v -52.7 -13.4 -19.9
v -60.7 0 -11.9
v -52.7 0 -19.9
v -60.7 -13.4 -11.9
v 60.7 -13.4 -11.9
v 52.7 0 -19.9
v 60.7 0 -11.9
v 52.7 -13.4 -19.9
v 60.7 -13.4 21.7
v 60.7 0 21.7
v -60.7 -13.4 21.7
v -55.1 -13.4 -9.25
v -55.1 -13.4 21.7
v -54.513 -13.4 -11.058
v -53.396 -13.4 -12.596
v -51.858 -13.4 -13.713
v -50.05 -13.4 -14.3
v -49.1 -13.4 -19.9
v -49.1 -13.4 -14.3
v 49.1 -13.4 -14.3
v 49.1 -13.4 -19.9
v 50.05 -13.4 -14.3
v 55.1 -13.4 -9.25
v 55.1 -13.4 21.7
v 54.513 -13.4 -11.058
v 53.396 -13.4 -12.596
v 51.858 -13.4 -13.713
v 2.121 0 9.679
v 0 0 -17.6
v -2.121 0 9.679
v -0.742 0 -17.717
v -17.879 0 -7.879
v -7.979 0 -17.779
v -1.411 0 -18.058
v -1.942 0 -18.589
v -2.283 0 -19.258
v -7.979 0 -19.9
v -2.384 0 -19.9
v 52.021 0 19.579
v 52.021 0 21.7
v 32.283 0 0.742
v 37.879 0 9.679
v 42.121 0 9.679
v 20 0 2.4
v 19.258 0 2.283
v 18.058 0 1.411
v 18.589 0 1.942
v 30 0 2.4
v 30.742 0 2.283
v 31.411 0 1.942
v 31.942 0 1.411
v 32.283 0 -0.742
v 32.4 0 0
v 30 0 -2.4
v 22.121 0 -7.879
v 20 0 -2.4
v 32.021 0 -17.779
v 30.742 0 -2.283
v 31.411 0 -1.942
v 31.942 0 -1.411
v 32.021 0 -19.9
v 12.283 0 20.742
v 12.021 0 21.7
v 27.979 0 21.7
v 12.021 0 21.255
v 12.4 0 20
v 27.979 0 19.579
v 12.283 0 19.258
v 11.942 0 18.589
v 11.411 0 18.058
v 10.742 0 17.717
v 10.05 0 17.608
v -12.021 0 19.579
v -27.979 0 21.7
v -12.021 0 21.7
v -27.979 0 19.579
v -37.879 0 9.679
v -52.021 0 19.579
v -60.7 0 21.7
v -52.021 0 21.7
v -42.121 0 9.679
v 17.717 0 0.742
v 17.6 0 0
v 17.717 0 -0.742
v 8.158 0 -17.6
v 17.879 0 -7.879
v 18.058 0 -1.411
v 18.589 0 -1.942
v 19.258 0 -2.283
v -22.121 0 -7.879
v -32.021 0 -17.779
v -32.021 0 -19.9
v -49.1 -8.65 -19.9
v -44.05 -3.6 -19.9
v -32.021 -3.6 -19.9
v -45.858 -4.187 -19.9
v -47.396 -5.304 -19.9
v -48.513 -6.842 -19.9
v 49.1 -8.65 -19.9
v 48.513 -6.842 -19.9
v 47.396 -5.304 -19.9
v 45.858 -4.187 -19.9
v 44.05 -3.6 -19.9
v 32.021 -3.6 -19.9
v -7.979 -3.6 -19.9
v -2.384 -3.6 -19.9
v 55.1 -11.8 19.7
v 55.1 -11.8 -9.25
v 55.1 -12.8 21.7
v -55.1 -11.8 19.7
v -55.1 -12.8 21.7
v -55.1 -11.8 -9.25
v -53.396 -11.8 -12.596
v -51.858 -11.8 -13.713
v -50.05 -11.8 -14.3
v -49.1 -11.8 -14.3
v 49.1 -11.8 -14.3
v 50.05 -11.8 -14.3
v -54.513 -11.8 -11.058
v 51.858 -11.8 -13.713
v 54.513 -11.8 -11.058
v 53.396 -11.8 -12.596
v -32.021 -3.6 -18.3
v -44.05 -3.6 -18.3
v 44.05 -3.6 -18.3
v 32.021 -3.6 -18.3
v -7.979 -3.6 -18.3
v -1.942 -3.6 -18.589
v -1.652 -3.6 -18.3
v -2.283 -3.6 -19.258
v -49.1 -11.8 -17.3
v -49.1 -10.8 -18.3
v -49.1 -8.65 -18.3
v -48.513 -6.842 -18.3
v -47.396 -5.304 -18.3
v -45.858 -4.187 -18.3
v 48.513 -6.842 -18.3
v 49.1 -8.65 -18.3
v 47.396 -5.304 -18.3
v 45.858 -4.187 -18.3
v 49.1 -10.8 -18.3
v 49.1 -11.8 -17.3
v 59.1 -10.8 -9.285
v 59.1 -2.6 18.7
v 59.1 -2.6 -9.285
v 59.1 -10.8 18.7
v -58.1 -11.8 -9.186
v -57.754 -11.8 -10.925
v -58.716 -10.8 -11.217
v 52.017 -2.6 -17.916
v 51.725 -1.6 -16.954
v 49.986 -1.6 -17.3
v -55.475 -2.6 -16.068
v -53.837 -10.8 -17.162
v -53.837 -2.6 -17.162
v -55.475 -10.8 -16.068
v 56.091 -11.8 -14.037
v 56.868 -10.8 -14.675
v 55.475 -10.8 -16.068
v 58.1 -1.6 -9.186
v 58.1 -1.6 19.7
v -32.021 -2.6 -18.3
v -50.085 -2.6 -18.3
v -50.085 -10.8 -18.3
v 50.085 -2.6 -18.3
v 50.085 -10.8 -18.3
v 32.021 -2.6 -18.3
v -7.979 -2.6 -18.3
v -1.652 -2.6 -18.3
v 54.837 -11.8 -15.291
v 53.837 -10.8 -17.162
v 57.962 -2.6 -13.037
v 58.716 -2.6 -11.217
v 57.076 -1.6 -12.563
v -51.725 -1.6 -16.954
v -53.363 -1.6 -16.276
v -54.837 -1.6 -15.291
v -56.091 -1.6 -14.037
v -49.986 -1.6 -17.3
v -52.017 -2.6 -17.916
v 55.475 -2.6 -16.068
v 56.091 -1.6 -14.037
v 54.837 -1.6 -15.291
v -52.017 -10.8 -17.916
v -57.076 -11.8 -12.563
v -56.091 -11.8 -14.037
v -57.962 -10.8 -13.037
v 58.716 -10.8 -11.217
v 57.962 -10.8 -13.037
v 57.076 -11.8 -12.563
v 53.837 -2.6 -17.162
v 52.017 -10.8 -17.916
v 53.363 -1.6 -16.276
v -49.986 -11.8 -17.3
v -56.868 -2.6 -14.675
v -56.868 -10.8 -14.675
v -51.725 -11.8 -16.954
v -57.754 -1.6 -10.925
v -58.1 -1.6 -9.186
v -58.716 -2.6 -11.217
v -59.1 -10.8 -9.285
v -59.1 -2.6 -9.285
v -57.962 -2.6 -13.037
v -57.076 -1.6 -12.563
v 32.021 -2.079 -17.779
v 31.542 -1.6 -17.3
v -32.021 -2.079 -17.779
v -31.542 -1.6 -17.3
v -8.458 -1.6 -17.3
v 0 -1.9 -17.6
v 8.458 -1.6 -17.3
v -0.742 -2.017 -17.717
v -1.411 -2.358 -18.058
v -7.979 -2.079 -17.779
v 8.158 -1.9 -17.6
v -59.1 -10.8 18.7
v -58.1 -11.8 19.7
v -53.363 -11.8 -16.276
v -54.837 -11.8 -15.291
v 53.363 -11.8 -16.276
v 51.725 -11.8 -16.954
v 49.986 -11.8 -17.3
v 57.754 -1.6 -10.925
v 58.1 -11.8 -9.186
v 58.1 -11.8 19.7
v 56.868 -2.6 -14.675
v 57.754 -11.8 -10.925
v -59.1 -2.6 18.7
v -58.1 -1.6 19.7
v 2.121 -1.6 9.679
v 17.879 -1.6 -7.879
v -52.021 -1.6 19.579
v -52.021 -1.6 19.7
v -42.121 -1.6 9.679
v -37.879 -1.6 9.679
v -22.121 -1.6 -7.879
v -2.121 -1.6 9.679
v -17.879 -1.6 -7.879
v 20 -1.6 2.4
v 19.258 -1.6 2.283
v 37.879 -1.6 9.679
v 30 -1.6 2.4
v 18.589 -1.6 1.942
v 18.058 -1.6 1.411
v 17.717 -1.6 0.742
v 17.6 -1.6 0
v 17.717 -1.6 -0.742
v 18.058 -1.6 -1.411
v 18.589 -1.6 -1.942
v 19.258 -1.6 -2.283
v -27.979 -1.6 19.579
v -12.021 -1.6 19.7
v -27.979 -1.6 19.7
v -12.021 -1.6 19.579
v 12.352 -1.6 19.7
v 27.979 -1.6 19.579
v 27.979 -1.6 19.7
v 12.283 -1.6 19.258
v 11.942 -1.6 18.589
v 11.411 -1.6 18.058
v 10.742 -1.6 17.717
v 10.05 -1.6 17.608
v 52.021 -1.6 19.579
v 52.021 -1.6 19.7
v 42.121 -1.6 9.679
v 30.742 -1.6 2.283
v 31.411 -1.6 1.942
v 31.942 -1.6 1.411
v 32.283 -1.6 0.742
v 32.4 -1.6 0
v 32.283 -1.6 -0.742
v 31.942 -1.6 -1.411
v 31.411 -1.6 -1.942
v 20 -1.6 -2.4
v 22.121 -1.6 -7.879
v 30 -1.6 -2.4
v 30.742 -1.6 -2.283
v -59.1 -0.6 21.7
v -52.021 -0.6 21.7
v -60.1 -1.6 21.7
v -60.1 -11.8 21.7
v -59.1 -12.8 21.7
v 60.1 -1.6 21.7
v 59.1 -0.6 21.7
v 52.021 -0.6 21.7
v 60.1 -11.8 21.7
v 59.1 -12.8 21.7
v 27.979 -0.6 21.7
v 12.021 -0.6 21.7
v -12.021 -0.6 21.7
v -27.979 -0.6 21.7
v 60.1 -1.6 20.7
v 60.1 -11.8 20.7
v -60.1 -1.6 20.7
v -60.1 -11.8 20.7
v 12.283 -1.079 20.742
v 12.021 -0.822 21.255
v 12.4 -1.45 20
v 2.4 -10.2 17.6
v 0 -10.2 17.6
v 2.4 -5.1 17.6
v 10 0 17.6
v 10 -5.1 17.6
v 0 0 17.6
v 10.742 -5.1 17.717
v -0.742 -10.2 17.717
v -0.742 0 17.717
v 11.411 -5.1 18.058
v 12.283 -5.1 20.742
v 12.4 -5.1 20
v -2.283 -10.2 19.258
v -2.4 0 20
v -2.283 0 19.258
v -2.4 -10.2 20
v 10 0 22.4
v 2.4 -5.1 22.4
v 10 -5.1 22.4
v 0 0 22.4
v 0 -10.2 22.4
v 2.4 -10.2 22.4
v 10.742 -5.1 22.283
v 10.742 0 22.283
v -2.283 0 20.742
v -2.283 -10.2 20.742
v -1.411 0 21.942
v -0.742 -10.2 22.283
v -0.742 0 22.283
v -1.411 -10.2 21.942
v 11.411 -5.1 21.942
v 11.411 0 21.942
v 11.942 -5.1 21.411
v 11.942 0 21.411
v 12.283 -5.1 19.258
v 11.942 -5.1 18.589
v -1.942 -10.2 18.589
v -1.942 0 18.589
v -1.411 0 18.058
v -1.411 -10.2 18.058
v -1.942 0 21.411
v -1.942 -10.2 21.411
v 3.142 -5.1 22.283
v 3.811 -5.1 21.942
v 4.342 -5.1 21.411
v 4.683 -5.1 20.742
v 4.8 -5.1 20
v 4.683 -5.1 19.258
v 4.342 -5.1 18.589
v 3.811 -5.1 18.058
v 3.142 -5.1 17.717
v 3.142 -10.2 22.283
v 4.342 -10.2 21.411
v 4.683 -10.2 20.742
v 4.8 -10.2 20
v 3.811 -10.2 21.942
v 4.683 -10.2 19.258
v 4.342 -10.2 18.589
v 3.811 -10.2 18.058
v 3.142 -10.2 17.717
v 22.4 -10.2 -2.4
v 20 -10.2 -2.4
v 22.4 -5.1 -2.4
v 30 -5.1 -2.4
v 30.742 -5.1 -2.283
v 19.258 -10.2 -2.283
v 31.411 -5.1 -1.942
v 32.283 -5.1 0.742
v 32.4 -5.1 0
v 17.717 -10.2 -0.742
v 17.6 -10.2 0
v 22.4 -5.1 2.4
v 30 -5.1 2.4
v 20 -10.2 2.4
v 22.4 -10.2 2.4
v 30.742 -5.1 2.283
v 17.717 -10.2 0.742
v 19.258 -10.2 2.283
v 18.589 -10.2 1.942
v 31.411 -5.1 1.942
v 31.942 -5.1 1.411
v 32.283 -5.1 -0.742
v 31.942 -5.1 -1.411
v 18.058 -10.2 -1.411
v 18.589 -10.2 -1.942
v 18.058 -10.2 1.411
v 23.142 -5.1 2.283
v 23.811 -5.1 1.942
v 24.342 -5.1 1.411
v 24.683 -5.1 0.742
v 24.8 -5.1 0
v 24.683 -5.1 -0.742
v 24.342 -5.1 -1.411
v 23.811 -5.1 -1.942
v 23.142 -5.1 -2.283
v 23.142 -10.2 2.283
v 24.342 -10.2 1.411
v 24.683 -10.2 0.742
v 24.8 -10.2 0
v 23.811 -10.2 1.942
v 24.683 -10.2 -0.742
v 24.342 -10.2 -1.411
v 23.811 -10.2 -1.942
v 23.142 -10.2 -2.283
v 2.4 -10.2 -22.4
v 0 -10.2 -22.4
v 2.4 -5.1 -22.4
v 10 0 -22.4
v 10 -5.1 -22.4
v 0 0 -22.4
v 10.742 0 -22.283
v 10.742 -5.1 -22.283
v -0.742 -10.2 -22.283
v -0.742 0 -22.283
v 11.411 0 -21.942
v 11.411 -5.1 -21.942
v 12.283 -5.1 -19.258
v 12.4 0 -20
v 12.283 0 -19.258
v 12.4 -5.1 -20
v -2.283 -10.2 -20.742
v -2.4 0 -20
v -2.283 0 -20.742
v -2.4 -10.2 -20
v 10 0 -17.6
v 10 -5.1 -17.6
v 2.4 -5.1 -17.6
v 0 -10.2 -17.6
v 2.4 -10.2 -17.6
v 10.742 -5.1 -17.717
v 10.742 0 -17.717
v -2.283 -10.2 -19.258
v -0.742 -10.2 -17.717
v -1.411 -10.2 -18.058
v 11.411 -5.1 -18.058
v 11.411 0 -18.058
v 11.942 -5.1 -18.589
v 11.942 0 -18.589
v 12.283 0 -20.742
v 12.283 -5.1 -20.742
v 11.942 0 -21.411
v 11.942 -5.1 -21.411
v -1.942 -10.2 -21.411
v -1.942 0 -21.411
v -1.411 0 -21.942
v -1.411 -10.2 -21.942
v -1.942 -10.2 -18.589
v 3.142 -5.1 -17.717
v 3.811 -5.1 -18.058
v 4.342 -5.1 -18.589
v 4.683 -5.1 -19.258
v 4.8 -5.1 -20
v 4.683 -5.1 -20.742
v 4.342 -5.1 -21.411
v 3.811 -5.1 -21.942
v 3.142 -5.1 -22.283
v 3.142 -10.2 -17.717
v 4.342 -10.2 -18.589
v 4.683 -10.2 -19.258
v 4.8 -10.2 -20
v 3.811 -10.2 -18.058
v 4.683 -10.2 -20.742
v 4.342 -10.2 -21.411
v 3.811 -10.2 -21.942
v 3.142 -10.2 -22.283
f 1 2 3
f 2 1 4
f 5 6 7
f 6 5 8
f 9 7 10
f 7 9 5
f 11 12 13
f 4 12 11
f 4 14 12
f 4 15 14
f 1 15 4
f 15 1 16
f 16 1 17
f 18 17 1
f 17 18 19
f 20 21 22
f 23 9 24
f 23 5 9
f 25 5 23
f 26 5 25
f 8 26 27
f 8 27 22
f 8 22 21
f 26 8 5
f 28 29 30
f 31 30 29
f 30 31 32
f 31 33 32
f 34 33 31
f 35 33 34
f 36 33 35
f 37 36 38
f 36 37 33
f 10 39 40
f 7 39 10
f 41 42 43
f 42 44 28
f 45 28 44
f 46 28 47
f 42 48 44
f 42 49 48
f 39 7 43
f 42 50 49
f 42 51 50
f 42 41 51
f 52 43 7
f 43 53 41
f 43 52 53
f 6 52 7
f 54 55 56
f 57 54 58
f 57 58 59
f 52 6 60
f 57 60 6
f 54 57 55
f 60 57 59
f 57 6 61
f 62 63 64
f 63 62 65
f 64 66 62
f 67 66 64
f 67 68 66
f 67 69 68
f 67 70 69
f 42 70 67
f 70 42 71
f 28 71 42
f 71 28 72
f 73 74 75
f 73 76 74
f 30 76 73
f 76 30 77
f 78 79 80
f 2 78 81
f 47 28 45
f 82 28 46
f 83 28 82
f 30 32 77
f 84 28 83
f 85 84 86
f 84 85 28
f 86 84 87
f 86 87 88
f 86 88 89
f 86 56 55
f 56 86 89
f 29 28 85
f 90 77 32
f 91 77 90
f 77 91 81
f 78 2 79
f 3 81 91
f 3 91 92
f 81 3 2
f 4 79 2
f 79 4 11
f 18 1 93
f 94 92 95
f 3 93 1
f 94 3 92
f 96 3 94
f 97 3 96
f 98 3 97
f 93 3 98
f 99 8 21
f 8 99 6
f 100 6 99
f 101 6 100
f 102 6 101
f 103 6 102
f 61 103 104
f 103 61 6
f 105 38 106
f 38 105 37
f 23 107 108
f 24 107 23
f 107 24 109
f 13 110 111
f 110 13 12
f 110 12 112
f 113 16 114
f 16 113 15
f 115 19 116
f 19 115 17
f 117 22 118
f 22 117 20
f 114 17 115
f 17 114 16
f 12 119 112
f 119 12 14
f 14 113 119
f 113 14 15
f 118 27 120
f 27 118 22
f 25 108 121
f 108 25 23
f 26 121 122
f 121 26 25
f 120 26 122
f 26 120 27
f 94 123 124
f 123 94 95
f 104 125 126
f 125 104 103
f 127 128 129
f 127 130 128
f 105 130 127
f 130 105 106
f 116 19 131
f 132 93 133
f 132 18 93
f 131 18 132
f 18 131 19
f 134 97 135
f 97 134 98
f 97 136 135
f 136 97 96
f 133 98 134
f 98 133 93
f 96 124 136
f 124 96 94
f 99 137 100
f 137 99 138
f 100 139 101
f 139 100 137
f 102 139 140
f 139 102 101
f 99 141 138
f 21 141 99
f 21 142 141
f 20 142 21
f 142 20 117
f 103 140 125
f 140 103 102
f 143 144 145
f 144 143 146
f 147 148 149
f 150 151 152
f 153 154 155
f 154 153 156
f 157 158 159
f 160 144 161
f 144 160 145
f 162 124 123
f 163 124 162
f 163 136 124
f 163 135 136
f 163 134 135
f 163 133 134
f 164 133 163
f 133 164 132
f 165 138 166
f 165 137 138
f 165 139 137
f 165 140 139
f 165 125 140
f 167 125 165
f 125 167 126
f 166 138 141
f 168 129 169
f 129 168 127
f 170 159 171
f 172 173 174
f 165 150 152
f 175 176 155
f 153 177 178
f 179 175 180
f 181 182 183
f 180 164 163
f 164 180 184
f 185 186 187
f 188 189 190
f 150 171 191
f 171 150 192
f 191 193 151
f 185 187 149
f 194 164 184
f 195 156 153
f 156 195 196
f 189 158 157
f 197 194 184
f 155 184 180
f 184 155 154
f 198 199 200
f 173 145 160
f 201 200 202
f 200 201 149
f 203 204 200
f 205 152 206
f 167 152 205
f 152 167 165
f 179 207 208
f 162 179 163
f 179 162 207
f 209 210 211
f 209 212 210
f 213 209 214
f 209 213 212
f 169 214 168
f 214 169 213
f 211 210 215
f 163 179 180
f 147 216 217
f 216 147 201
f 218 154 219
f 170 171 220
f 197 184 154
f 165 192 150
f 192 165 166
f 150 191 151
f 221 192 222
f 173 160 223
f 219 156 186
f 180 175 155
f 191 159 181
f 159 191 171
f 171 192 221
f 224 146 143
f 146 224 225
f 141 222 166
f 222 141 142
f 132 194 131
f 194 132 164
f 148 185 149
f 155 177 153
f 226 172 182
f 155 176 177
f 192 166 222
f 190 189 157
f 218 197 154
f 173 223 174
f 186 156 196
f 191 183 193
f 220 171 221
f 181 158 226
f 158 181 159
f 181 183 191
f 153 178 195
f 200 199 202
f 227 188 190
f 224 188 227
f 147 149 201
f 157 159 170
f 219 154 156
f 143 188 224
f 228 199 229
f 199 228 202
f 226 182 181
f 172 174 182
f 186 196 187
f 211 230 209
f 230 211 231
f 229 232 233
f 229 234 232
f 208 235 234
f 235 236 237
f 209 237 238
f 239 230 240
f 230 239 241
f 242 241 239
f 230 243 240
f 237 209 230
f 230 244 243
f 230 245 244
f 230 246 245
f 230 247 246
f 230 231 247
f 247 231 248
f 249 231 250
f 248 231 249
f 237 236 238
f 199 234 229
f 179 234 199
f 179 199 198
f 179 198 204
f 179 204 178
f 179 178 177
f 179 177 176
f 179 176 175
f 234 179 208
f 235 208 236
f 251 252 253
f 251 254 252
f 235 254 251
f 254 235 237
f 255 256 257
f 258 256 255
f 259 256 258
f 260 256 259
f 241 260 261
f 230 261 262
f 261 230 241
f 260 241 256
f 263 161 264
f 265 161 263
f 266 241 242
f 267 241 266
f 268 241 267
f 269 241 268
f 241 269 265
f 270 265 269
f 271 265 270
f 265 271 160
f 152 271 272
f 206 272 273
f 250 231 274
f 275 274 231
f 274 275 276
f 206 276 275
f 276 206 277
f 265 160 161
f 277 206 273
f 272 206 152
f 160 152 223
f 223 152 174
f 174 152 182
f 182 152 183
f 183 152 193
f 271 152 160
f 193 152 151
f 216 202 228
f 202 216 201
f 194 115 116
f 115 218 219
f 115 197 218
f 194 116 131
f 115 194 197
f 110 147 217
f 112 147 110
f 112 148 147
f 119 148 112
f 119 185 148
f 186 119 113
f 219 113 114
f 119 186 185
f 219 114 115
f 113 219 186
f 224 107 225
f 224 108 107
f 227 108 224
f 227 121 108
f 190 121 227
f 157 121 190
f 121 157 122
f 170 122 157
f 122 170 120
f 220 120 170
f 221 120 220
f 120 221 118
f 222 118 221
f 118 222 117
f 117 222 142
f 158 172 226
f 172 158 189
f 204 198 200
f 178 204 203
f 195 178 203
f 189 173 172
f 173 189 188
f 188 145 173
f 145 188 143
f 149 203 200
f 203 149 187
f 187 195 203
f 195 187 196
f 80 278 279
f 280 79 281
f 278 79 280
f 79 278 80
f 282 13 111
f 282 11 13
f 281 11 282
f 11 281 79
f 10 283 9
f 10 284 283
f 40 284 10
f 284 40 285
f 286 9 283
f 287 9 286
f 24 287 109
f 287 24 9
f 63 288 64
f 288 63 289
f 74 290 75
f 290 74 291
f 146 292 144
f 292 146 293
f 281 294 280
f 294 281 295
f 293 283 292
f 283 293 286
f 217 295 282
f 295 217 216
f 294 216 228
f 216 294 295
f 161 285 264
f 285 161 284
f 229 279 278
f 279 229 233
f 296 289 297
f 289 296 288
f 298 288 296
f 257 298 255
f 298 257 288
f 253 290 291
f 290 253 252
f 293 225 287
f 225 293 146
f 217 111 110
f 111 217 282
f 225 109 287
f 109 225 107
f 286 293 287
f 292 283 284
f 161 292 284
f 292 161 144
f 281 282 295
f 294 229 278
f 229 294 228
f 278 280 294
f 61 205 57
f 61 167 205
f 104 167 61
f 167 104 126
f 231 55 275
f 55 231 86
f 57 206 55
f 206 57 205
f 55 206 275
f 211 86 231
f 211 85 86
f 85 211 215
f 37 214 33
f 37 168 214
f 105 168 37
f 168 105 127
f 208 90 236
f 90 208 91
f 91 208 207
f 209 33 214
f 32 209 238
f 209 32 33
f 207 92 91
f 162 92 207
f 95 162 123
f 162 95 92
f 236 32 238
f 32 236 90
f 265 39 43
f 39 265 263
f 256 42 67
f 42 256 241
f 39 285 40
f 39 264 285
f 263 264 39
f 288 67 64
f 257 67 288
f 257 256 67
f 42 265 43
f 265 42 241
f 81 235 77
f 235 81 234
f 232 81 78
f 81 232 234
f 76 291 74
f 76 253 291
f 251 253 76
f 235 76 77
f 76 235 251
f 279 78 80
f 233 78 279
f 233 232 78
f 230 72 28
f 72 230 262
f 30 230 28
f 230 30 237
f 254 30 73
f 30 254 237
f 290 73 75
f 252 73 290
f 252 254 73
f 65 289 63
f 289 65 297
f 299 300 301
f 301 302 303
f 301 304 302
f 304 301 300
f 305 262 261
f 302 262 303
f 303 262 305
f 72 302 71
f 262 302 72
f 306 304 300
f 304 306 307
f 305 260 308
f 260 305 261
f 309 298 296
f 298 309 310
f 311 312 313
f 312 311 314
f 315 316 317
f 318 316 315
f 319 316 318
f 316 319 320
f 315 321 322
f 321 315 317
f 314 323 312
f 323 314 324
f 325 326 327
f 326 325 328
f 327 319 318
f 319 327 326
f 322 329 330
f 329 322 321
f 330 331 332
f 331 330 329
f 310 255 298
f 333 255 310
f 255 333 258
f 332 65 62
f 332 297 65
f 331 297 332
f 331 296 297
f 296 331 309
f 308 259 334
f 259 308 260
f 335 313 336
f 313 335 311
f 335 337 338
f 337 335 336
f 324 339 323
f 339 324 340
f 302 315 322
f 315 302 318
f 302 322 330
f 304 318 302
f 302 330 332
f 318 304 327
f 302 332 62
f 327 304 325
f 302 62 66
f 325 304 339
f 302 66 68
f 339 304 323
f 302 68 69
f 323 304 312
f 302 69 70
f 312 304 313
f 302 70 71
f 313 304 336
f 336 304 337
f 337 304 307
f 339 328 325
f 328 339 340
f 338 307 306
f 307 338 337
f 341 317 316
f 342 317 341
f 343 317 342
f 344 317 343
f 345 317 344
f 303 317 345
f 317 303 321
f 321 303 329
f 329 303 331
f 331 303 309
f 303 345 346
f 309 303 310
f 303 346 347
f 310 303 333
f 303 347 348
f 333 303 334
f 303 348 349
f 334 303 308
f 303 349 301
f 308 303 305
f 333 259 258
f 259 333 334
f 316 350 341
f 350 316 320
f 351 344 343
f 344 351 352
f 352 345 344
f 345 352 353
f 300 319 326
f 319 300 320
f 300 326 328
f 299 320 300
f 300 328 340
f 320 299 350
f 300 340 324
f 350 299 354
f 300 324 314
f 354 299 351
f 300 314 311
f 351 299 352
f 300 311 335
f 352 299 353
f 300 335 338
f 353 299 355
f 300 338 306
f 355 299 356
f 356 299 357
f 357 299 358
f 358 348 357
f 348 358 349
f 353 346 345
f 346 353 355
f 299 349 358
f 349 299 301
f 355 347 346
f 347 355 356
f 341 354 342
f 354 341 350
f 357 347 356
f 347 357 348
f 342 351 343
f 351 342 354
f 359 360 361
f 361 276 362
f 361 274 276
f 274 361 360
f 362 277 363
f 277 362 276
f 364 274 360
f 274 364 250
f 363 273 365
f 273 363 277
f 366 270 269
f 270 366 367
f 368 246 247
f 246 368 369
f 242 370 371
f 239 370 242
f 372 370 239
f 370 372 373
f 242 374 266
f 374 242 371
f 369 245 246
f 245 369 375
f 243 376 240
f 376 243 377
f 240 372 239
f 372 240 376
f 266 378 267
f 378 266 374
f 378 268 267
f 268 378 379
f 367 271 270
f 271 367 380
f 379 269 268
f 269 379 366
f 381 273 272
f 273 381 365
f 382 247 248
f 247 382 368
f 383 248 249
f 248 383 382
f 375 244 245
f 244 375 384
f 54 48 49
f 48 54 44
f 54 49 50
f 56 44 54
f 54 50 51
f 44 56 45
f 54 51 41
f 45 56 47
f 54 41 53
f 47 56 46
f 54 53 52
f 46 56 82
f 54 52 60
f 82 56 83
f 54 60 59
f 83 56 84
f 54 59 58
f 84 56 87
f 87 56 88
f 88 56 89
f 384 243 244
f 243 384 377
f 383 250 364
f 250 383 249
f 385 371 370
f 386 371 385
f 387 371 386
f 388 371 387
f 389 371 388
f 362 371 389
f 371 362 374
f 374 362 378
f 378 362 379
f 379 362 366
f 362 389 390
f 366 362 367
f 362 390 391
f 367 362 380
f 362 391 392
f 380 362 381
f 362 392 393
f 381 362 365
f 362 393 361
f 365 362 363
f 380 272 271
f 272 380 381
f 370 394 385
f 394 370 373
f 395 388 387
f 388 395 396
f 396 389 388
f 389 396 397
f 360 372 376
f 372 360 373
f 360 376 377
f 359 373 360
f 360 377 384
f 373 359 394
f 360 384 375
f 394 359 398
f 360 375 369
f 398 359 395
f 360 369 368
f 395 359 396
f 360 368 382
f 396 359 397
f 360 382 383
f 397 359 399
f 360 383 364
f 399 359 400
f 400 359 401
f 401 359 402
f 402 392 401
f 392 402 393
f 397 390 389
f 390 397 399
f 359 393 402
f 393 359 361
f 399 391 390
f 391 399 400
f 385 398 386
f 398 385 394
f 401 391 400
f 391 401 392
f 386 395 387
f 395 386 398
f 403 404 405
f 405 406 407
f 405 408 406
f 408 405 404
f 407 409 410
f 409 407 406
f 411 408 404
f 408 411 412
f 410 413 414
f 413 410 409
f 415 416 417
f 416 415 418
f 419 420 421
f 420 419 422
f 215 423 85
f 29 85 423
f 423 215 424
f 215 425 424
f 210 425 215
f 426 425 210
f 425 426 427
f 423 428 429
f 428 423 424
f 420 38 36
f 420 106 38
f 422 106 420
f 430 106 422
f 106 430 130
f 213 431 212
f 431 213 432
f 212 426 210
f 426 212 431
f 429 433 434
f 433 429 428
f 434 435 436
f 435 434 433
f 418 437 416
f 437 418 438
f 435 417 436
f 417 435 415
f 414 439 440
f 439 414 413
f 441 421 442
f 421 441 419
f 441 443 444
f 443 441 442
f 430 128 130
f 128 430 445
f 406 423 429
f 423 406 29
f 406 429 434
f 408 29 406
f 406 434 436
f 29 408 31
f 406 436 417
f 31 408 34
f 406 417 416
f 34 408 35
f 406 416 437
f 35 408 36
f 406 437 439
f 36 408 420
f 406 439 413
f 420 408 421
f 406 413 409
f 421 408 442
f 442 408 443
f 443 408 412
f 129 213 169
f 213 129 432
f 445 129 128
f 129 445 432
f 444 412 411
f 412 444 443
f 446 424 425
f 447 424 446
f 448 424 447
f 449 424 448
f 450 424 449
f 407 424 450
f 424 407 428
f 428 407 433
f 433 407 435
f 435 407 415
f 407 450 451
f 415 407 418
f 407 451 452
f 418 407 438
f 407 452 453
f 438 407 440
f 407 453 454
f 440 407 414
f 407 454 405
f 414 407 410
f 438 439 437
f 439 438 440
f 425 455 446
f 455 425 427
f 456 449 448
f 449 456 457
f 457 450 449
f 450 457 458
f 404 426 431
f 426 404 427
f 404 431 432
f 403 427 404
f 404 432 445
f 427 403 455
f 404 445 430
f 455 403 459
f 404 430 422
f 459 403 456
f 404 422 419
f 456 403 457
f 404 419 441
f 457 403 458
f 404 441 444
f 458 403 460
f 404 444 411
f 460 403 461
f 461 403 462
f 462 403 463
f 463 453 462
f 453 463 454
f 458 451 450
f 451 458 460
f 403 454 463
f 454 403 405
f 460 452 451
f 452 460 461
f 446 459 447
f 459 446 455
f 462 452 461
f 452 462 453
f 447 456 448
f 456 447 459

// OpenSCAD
include <BOSL/constants.scad>
use <BOSL/shapes.scad>
use <BOSL/transforms.scad>
use <jb-scad/skadis.scad>

x_inner=118+.2;
y_inner=80;
z_inner=10+.2;
w=1.6;


xrot(90) union() {
    ymove(y_inner/4+1.7) case();
    skadis_hook_triple();
}

module plate() {
    x=118+.2;
    y=80;
    
    zmove(z_inner/2+w) hull() {
        cuboid([x_inner, y_inner, z_inner-2], fillet=10, edges=EDGES_Z_ALL);
        cuboid([x_inner-2, y_inner-2, z_inner], fillet=9, edges=EDGES_Z_ALL);
    }
}

module notch() {
    ymove(2) zmove(z_inner/2+w) hull() {
        cuboid([x_inner, 10, z_inner-2]);
        cuboid([x_inner-2, 10-2, z_inner]);
        cuboid([x_inner+2, 6, z_inner]);
        cuboid([x_inner, 6-2, z_inner+2]);
    }
}

module case() {
    difference() {
        cuboid(
            [x_inner+2*w, y_inner+2*w, z_inner+2*w], chamfer=8,  
            edges=EDGES_Z_ALL, align=V_TOP
        );
        plate();
        zmove(w) cuboid([x_inner-8, y_inner-8, z_inner+3], fillet=6, edges=EDGES_Z_ALL, align=V_TOP);
        zmove(w+2) cuboid([x_inner-20, 2*y_inner, z_inner+3], fillet=6, edges=EDGES_BOTTOM, align=V_TOP);
        cuboid([2*x_inner, y_inner, 3*z_inner], align=V_BACK);
        notch();
        move(y=-y_inner/2-w, x=20) zrot(45) cuboid([20, 20, 20], chamfer=3);
        move(y=-y_inner/2-w, x=-20) zrot(45) cuboid([20, 20, 20], chamfer=3);
        move(x=40) zrot(45) cuboid([20, 20, 20], chamfer=3);
        move(x=-40) zrot(45) cuboid([20, 20, 20], chamfer=3);
        zrot(45) cuboid([20, 20, 20], chamfer=3);
    }
}
